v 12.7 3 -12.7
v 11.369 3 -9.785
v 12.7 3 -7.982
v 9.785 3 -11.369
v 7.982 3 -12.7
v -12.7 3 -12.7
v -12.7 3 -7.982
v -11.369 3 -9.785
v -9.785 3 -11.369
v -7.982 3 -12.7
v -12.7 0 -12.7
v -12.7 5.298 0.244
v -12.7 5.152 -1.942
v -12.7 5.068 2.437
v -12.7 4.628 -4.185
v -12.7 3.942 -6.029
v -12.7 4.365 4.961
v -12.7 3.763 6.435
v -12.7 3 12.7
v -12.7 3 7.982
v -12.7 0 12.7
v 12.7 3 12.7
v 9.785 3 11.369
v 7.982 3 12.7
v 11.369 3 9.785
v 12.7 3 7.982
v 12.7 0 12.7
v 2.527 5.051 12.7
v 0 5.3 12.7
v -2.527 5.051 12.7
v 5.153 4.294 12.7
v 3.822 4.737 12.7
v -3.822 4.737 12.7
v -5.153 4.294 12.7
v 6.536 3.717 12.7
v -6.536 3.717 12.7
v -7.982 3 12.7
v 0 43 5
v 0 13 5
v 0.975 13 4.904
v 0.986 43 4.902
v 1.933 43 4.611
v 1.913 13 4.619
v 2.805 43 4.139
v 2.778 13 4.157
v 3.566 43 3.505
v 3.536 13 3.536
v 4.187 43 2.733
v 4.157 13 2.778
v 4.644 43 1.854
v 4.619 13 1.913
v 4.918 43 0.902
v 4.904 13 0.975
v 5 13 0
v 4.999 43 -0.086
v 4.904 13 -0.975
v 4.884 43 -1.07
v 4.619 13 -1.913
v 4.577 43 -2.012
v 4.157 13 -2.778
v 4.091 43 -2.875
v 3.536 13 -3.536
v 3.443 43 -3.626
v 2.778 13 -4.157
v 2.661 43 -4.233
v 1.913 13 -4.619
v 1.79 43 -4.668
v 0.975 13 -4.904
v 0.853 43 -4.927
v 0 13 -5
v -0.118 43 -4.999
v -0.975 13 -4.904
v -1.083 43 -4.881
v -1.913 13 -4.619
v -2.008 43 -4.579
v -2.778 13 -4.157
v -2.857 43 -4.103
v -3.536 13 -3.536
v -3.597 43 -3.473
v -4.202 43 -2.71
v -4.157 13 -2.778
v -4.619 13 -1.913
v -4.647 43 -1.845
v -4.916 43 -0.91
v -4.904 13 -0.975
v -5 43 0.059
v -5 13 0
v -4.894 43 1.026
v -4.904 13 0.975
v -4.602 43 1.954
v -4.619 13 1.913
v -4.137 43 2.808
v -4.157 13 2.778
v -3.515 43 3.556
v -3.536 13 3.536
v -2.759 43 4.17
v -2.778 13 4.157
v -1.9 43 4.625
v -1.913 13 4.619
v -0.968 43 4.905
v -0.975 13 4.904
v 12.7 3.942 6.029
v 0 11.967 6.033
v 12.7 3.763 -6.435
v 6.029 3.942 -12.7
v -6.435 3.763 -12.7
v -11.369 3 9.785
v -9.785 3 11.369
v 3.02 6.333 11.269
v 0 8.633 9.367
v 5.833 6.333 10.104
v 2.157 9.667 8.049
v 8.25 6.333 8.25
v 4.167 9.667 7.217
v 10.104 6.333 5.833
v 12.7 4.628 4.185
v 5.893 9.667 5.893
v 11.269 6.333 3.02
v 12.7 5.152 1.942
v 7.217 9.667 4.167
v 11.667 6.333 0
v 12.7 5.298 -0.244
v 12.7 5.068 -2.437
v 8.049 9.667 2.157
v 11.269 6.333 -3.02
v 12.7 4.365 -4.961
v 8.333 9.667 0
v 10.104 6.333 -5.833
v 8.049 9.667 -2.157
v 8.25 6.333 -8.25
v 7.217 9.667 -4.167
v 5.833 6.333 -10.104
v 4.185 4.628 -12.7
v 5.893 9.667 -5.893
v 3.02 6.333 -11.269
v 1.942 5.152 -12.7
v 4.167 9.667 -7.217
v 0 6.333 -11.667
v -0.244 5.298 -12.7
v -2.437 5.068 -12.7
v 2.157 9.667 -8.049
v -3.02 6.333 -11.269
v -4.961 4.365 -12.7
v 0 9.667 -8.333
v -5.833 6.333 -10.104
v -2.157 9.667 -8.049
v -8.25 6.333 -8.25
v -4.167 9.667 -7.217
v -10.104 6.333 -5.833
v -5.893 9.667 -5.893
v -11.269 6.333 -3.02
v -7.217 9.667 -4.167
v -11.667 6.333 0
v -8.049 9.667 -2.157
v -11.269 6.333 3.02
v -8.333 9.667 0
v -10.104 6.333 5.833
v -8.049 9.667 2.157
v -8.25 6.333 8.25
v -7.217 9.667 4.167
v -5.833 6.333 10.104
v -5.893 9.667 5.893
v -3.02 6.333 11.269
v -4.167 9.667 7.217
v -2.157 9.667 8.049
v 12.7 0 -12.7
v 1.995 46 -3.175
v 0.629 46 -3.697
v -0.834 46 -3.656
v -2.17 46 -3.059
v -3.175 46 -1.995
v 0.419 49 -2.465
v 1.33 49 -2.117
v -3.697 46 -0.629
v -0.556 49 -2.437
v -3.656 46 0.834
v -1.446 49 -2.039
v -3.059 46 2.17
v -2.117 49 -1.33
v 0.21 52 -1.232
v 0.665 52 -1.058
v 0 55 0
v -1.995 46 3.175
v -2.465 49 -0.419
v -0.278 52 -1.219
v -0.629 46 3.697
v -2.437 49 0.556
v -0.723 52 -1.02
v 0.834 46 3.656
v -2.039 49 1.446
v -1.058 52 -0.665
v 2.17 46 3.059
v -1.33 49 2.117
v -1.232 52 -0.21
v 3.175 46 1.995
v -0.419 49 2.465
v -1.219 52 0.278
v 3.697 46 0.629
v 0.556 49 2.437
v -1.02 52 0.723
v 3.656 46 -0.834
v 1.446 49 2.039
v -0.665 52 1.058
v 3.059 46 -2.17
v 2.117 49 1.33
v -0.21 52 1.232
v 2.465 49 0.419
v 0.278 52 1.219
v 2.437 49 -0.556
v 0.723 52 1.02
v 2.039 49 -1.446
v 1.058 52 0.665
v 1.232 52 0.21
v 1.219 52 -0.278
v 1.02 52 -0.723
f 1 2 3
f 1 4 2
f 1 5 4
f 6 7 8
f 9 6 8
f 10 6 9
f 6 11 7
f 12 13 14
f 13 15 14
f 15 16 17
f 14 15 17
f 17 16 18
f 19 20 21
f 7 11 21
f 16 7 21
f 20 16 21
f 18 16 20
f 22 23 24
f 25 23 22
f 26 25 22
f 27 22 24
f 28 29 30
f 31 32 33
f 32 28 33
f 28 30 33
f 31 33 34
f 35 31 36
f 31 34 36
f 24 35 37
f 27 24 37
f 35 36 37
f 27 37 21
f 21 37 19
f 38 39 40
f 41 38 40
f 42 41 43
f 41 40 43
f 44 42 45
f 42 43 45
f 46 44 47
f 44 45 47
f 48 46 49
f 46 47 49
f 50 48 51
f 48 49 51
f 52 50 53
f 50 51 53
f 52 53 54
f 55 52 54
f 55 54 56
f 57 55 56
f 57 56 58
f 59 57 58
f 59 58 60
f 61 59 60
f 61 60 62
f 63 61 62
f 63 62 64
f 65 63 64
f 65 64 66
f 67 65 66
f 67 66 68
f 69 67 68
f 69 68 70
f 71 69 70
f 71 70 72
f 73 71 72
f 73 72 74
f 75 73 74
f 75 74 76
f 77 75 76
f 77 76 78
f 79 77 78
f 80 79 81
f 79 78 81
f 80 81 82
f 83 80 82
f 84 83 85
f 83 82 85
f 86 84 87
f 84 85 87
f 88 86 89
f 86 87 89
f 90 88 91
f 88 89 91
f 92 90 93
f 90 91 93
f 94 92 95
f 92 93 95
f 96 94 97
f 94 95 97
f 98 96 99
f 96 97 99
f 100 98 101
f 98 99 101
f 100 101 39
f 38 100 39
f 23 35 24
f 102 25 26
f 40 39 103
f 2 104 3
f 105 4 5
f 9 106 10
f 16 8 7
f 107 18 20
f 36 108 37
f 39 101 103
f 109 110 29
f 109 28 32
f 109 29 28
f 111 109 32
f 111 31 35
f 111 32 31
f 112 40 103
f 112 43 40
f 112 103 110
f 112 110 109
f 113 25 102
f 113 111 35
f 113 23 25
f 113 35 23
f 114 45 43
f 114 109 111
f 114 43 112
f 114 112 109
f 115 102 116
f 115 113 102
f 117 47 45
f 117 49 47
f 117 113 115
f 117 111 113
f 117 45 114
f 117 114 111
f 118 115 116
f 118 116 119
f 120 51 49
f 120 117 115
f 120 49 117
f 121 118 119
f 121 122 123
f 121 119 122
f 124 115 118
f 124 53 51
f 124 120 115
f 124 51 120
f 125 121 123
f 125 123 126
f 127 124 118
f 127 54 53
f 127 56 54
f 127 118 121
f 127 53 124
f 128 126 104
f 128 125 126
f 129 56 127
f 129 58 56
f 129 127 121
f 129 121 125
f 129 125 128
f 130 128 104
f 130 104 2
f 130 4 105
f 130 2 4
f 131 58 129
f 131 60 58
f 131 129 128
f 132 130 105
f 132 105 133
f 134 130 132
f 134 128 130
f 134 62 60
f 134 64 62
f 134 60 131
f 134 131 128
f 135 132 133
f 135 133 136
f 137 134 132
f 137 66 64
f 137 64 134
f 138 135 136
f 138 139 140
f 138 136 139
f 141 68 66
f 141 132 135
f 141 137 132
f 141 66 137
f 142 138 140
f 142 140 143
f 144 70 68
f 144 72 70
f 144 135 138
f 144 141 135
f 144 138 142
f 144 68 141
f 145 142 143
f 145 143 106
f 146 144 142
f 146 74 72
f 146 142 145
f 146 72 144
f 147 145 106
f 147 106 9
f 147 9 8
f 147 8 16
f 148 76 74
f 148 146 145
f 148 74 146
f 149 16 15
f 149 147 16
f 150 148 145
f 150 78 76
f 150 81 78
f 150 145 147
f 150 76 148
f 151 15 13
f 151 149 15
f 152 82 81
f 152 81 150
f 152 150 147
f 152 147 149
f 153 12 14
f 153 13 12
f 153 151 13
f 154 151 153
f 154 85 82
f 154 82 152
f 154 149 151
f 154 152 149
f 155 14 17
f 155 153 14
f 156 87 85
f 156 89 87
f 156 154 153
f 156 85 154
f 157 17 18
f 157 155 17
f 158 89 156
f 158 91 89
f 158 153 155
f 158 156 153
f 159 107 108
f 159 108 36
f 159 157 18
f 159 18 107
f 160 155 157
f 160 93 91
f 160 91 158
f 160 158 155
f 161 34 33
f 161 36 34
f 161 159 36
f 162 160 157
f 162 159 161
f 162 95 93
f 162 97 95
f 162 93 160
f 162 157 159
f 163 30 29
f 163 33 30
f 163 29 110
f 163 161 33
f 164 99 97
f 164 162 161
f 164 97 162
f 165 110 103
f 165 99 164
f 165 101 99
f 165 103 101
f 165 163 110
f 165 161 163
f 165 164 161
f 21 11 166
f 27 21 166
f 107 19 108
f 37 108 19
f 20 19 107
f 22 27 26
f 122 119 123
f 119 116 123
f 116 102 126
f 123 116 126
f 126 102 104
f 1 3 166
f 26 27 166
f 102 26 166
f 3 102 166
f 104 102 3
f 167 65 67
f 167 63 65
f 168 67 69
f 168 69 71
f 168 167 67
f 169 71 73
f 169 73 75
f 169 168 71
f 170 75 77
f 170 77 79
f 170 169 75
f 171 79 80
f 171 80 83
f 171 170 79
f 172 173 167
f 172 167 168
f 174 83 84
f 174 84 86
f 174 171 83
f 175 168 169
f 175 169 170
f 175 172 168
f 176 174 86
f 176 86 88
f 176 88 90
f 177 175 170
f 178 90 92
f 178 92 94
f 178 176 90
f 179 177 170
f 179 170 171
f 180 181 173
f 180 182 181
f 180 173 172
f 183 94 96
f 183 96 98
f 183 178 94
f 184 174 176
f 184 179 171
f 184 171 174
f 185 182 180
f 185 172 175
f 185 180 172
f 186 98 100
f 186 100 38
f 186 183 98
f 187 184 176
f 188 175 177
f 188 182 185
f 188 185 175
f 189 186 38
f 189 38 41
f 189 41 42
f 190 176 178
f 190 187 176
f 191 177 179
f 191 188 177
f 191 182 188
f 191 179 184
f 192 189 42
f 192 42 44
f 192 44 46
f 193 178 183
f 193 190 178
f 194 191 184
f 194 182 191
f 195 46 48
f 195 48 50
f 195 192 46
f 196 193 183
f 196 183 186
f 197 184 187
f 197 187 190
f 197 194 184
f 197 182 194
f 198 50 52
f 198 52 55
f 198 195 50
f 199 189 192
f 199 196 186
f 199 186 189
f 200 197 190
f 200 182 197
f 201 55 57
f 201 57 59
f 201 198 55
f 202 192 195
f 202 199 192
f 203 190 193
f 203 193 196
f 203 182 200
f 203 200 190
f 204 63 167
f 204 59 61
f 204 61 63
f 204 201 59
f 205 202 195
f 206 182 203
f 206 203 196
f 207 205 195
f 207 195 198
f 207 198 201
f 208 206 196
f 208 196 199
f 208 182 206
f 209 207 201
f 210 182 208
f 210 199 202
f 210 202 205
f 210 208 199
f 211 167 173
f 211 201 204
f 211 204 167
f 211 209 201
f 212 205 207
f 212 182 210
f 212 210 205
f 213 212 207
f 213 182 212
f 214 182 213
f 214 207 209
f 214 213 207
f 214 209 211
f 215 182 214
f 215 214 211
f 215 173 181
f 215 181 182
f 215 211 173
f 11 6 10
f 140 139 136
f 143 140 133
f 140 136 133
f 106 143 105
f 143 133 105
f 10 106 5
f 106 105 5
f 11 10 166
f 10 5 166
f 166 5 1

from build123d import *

# Parameters (mm, degrees)
SKETCH1_W           = 25.4
SKETCH1_H           = 25.4
BOSS_EXTRUDE1_DEPTH = 3
SKETCH2_R           = 5
BOSS_EXTRUDE2_DEPTH = 40
CHAMFER1_SIZE       = 10


with BuildPart() as part:
    # Sketch1 → Boss-Extrude1 (new body)
    with BuildSketch(Plane(origin=(0, 0, 0), x_dir=(1, 0, 0), z_dir=(0, 1, 0))):
        Rectangle(SKETCH1_W, SKETCH1_H)
    extrude(amount=BOSS_EXTRUDE1_DEPTH)

    # Sketch2 → Boss-Extrude2 (add)
    with BuildSketch(Plane(origin=(0, 3, 0), x_dir=(1, 0, 0), z_dir=(0, 1, 0))):
        with Locations(Location((0, 0, 0), (0, 0, 270))):
            Circle(SKETCH2_R)
    extrude(amount=BOSS_EXTRUDE2_DEPTH)

    # Chamfer1
    # the kernel refuses this chamfer: 10 mm, written as the material it adds along each edge
    with BuildSketch(Plane(origin=(0, 3, 0), x_dir=(0, 0, 1), z_dir=(-1, 0, 0))) as chamfer1_piece_1_section:
        Polygon((5 + CHAMFER1_SIZE, 0), (5, CHAMFER1_SIZE), (5, 0), align=None)
    chamfer1_piece_1 = revolve(axis=Axis((0, 3, 0), (0, 1, 0)), mode=Mode.PRIVATE)
    chamfer1_piece_1 = split(chamfer1_piece_1, bisect_by=Plane(origin=(0, 7.901138133, -12.7), z_dir=(0, 0, 1)), keep=Keep.TOP, mode=Mode.PRIVATE)
    chamfer1_piece_1 = split(chamfer1_piece_1, bisect_by=Plane(origin=(-12.7, 7.901138133, -9.901138133), z_dir=(1, 0, 0)), keep=Keep.TOP, mode=Mode.PRIVATE)
    chamfer1_piece_1 = split(chamfer1_piece_1, bisect_by=Plane(origin=(12.7, 7.901138133, -9.901138133), z_dir=(-1, 0, 0)), keep=Keep.TOP, mode=Mode.PRIVATE)
    chamfer1_piece_1 = split(chamfer1_piece_1, bisect_by=Plane(origin=(0, 7.901138133, 12.7), z_dir=(0, 0, -1)), keep=Keep.TOP, mode=Mode.PRIVATE)
    add(chamfer1_piece_1)

    # Sketch3 → Revolve1 (revolve)
    with BuildSketch(Plane(origin=(0, 0, 0), x_dir=(0, 0, -1), z_dir=(1, 0, 0)), mode=Mode.PRIVATE) as revolve1_sk:
        Polygon((0, 55), (0, 43), (5, 43), align=None)
    revolve(revolve1_sk.sketch.rotate(Axis((0, 0, 0), (0, 1, 0)), 327.850947574), axis=Axis((0, 0, 0), (0, 1, 0)))


solid = part.part
